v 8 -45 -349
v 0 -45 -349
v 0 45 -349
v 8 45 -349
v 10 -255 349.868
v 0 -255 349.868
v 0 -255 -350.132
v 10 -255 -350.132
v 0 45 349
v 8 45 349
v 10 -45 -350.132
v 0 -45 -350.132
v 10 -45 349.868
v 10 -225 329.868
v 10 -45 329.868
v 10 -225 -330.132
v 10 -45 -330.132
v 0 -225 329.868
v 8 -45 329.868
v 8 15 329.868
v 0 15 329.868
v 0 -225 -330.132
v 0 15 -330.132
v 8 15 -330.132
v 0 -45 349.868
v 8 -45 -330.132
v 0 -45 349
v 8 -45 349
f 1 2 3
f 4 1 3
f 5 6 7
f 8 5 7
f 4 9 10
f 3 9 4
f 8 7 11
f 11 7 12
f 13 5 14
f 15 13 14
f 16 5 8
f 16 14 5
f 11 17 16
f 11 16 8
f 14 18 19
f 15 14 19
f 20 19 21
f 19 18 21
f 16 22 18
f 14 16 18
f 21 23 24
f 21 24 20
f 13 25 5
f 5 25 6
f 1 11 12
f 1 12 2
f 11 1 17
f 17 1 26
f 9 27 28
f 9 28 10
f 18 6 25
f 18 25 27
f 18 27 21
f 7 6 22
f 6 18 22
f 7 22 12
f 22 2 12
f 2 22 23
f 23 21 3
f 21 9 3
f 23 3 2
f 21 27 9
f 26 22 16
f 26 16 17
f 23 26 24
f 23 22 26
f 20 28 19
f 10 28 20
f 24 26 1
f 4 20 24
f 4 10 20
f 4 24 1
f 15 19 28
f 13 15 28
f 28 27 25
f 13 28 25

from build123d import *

# Parameters (mm, degrees)
SALIENTE_EXTRUIR1_DEPTH = 10
CROQUIS1_3_W            = 698
CROQUIS1_3_H            = 90
SALIENTE_EXTRUIR2_DEPTH = 8
CROQUIS2_W              = 660
CROQUIS2_H              = 240
CORTAR_EXTRUIR1_DEPTH   = 10


with BuildPart() as part:
    # Croquis1 → Saliente-Extruir1 (new body)
    with BuildSketch(Plane(origin=(0, 0, 0), x_dir=(0, 0, -1), z_dir=(1, 0, 0))):
        Polygon((349, -45), (-349, -45), (-349.868447372, -45), (-349.868447372, -255), (350.131552628, -255), (350.131552628, -45), align=None)
    extrude(amount=SALIENTE_EXTRUIR1_DEPTH)

    # Croquis1<3> → Saliente-Extruir2 (add)
    with BuildSketch(Plane(origin=(0, 0, 0), x_dir=(0, 0, -1), z_dir=(1, 0, 0))):
        Rectangle(CROQUIS1_3_W, CROQUIS1_3_H)
    extrude(amount=SALIENTE_EXTRUIR2_DEPTH)

    # Croquis2 → Cortar-Extruir1 (cut)
    with BuildSketch(Plane.ZY):
        with Locations((-0.131552628, -105)):
            Rectangle(CROQUIS2_W, CROQUIS2_H)
    extrude(amount=-CORTAR_EXTRUIR1_DEPTH, mode=Mode.SUBTRACT)


solid = part.part
